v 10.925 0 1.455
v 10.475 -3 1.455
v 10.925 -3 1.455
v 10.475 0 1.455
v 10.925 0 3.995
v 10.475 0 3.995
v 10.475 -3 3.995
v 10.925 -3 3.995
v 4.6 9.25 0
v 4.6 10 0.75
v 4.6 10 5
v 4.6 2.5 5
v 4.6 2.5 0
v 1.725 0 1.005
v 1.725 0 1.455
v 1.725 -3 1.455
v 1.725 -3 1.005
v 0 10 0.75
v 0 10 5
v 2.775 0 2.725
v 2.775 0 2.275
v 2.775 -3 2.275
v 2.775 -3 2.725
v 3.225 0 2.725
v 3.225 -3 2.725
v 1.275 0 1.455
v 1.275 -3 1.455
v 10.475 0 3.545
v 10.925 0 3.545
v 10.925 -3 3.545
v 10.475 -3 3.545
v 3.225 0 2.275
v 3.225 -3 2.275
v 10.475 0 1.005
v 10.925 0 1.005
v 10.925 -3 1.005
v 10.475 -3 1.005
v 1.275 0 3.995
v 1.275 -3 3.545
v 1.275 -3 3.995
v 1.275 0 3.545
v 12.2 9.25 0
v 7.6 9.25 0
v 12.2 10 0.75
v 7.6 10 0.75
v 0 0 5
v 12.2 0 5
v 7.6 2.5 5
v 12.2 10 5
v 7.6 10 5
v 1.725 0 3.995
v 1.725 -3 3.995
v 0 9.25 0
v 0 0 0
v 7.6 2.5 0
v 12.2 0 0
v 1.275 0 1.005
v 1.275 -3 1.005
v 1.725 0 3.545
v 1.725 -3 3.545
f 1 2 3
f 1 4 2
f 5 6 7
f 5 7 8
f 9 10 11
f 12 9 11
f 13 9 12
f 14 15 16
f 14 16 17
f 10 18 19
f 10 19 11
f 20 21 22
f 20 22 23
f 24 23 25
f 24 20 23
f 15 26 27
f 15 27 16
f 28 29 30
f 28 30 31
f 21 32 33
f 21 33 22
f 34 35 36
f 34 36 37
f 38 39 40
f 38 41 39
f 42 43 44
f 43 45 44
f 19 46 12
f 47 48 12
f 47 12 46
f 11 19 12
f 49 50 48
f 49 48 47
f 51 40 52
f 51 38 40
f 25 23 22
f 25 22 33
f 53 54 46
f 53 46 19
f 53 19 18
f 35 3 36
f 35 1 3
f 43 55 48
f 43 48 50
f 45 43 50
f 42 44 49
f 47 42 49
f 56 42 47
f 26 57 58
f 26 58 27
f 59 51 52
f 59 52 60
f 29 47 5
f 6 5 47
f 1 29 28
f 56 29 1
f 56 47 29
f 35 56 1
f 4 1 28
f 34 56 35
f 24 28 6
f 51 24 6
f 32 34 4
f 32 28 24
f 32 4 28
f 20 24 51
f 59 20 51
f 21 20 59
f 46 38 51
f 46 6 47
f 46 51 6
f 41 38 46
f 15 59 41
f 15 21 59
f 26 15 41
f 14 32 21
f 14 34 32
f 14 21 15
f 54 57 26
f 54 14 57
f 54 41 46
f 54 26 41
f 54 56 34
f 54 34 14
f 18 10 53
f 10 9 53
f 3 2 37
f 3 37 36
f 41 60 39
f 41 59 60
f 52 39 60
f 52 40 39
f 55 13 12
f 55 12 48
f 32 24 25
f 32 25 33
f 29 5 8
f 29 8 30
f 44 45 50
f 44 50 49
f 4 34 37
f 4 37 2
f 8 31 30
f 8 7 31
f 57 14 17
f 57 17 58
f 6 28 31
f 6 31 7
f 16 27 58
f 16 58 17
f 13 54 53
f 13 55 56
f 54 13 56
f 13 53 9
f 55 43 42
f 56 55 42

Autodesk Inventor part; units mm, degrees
ref_plane "YZ Plane" through (0, 0, 0) normal (1, 0, 0) x (0, 1, 0)
ref_plane "XZ Plane" through (0, 0, 0) normal (0, 1, 0) x (-1, 0, 0)
ref_plane "XY Plane" through (0, 0, 0) normal (0, 0, 1) x (1, 0, 0)
sketch "Sketch1" plane through (0, 0, 0) normal (0, 0, 1) x (1, 0, 0)
  line L0 (0, 0) -> (0, 10)
  line L1 (0, 10) -> (4.6, 10)
  line L2 (4.6, 10) -> (4.6, 2.5)
  line L3 (4.6, 2.5) -> (7.6, 2.5)
  line L4 (7.6, 2.5) -> (7.6, 10)
  line L5 (7.6, 10) -> (12.2, 10)
  line L6 (12.2, 10) -> (12.2, 0)
  line L7 (12.2, 0) -> (0, 0)
  dimension "d0" = 12.2
  dimension "d1" = 10
  dimension "d2" = 7.5
  dimension "d3" = 3
extrude "Extrusion1" add sketch "Sketch1" along normal blind 5
sketch "Sketch2" plane through (0, 0, 0) normal (0, -1, 0) x (1, 0, 0)
  line L0 (0, 0) -> (0, 5) projected
  line L1 (1.5, 3.77) -> (10.7, 3.77) construction
  line L2 (0, 5) -> (12.2, 5) construction
  line L3 (1.275, 3.995) -> (1.725, 3.995)
  line L4 (1.725, 3.995) -> (1.725, 3.545)
  line L5 (1.725, 3.545) -> (1.275, 3.545)
  line L6 (1.275, 3.545) -> (1.275, 3.995)
  line L7 (1.275, 3.995) -> (1.725, 3.545) construction
  line L8 (1.725, 3.995) -> (1.275, 3.545) construction
  point P0 (1.5, 1.23)
  point P1 (3, 2.5)
  point P2 (10.7, 1.23)
  point P3 (0, 2.5)
  point P4 (6.1, 3.77)
  point P5 (6.1, 5)
  dimension "d6" = 1.27
  dimension "d7" = 1.27
  dimension "d8" = 1.5
  dimension "d9" = 9.2
  dimension "d10" = 0.45
  dimension "d11" = 0.45
extrude "Extrusion2" add sketch "Sketch2" along normal blind 3
pattern_sketch "Sketch Driven Pattern1" of "Extrusion2" from (1.5, 0, 3.77) copies at (1.5, 0, 1.23) at (3, 0, 2.5) at (10.7, 0, 3.77) at (10.7, 0, 1.23)
chamfer "Chamfer1" distance 0.75 angle 45 2 edges at (9.9, 10, 0) (2.3, 10, 0)
properties part number "GP1A52HRJ00F (Large slot detector)"
